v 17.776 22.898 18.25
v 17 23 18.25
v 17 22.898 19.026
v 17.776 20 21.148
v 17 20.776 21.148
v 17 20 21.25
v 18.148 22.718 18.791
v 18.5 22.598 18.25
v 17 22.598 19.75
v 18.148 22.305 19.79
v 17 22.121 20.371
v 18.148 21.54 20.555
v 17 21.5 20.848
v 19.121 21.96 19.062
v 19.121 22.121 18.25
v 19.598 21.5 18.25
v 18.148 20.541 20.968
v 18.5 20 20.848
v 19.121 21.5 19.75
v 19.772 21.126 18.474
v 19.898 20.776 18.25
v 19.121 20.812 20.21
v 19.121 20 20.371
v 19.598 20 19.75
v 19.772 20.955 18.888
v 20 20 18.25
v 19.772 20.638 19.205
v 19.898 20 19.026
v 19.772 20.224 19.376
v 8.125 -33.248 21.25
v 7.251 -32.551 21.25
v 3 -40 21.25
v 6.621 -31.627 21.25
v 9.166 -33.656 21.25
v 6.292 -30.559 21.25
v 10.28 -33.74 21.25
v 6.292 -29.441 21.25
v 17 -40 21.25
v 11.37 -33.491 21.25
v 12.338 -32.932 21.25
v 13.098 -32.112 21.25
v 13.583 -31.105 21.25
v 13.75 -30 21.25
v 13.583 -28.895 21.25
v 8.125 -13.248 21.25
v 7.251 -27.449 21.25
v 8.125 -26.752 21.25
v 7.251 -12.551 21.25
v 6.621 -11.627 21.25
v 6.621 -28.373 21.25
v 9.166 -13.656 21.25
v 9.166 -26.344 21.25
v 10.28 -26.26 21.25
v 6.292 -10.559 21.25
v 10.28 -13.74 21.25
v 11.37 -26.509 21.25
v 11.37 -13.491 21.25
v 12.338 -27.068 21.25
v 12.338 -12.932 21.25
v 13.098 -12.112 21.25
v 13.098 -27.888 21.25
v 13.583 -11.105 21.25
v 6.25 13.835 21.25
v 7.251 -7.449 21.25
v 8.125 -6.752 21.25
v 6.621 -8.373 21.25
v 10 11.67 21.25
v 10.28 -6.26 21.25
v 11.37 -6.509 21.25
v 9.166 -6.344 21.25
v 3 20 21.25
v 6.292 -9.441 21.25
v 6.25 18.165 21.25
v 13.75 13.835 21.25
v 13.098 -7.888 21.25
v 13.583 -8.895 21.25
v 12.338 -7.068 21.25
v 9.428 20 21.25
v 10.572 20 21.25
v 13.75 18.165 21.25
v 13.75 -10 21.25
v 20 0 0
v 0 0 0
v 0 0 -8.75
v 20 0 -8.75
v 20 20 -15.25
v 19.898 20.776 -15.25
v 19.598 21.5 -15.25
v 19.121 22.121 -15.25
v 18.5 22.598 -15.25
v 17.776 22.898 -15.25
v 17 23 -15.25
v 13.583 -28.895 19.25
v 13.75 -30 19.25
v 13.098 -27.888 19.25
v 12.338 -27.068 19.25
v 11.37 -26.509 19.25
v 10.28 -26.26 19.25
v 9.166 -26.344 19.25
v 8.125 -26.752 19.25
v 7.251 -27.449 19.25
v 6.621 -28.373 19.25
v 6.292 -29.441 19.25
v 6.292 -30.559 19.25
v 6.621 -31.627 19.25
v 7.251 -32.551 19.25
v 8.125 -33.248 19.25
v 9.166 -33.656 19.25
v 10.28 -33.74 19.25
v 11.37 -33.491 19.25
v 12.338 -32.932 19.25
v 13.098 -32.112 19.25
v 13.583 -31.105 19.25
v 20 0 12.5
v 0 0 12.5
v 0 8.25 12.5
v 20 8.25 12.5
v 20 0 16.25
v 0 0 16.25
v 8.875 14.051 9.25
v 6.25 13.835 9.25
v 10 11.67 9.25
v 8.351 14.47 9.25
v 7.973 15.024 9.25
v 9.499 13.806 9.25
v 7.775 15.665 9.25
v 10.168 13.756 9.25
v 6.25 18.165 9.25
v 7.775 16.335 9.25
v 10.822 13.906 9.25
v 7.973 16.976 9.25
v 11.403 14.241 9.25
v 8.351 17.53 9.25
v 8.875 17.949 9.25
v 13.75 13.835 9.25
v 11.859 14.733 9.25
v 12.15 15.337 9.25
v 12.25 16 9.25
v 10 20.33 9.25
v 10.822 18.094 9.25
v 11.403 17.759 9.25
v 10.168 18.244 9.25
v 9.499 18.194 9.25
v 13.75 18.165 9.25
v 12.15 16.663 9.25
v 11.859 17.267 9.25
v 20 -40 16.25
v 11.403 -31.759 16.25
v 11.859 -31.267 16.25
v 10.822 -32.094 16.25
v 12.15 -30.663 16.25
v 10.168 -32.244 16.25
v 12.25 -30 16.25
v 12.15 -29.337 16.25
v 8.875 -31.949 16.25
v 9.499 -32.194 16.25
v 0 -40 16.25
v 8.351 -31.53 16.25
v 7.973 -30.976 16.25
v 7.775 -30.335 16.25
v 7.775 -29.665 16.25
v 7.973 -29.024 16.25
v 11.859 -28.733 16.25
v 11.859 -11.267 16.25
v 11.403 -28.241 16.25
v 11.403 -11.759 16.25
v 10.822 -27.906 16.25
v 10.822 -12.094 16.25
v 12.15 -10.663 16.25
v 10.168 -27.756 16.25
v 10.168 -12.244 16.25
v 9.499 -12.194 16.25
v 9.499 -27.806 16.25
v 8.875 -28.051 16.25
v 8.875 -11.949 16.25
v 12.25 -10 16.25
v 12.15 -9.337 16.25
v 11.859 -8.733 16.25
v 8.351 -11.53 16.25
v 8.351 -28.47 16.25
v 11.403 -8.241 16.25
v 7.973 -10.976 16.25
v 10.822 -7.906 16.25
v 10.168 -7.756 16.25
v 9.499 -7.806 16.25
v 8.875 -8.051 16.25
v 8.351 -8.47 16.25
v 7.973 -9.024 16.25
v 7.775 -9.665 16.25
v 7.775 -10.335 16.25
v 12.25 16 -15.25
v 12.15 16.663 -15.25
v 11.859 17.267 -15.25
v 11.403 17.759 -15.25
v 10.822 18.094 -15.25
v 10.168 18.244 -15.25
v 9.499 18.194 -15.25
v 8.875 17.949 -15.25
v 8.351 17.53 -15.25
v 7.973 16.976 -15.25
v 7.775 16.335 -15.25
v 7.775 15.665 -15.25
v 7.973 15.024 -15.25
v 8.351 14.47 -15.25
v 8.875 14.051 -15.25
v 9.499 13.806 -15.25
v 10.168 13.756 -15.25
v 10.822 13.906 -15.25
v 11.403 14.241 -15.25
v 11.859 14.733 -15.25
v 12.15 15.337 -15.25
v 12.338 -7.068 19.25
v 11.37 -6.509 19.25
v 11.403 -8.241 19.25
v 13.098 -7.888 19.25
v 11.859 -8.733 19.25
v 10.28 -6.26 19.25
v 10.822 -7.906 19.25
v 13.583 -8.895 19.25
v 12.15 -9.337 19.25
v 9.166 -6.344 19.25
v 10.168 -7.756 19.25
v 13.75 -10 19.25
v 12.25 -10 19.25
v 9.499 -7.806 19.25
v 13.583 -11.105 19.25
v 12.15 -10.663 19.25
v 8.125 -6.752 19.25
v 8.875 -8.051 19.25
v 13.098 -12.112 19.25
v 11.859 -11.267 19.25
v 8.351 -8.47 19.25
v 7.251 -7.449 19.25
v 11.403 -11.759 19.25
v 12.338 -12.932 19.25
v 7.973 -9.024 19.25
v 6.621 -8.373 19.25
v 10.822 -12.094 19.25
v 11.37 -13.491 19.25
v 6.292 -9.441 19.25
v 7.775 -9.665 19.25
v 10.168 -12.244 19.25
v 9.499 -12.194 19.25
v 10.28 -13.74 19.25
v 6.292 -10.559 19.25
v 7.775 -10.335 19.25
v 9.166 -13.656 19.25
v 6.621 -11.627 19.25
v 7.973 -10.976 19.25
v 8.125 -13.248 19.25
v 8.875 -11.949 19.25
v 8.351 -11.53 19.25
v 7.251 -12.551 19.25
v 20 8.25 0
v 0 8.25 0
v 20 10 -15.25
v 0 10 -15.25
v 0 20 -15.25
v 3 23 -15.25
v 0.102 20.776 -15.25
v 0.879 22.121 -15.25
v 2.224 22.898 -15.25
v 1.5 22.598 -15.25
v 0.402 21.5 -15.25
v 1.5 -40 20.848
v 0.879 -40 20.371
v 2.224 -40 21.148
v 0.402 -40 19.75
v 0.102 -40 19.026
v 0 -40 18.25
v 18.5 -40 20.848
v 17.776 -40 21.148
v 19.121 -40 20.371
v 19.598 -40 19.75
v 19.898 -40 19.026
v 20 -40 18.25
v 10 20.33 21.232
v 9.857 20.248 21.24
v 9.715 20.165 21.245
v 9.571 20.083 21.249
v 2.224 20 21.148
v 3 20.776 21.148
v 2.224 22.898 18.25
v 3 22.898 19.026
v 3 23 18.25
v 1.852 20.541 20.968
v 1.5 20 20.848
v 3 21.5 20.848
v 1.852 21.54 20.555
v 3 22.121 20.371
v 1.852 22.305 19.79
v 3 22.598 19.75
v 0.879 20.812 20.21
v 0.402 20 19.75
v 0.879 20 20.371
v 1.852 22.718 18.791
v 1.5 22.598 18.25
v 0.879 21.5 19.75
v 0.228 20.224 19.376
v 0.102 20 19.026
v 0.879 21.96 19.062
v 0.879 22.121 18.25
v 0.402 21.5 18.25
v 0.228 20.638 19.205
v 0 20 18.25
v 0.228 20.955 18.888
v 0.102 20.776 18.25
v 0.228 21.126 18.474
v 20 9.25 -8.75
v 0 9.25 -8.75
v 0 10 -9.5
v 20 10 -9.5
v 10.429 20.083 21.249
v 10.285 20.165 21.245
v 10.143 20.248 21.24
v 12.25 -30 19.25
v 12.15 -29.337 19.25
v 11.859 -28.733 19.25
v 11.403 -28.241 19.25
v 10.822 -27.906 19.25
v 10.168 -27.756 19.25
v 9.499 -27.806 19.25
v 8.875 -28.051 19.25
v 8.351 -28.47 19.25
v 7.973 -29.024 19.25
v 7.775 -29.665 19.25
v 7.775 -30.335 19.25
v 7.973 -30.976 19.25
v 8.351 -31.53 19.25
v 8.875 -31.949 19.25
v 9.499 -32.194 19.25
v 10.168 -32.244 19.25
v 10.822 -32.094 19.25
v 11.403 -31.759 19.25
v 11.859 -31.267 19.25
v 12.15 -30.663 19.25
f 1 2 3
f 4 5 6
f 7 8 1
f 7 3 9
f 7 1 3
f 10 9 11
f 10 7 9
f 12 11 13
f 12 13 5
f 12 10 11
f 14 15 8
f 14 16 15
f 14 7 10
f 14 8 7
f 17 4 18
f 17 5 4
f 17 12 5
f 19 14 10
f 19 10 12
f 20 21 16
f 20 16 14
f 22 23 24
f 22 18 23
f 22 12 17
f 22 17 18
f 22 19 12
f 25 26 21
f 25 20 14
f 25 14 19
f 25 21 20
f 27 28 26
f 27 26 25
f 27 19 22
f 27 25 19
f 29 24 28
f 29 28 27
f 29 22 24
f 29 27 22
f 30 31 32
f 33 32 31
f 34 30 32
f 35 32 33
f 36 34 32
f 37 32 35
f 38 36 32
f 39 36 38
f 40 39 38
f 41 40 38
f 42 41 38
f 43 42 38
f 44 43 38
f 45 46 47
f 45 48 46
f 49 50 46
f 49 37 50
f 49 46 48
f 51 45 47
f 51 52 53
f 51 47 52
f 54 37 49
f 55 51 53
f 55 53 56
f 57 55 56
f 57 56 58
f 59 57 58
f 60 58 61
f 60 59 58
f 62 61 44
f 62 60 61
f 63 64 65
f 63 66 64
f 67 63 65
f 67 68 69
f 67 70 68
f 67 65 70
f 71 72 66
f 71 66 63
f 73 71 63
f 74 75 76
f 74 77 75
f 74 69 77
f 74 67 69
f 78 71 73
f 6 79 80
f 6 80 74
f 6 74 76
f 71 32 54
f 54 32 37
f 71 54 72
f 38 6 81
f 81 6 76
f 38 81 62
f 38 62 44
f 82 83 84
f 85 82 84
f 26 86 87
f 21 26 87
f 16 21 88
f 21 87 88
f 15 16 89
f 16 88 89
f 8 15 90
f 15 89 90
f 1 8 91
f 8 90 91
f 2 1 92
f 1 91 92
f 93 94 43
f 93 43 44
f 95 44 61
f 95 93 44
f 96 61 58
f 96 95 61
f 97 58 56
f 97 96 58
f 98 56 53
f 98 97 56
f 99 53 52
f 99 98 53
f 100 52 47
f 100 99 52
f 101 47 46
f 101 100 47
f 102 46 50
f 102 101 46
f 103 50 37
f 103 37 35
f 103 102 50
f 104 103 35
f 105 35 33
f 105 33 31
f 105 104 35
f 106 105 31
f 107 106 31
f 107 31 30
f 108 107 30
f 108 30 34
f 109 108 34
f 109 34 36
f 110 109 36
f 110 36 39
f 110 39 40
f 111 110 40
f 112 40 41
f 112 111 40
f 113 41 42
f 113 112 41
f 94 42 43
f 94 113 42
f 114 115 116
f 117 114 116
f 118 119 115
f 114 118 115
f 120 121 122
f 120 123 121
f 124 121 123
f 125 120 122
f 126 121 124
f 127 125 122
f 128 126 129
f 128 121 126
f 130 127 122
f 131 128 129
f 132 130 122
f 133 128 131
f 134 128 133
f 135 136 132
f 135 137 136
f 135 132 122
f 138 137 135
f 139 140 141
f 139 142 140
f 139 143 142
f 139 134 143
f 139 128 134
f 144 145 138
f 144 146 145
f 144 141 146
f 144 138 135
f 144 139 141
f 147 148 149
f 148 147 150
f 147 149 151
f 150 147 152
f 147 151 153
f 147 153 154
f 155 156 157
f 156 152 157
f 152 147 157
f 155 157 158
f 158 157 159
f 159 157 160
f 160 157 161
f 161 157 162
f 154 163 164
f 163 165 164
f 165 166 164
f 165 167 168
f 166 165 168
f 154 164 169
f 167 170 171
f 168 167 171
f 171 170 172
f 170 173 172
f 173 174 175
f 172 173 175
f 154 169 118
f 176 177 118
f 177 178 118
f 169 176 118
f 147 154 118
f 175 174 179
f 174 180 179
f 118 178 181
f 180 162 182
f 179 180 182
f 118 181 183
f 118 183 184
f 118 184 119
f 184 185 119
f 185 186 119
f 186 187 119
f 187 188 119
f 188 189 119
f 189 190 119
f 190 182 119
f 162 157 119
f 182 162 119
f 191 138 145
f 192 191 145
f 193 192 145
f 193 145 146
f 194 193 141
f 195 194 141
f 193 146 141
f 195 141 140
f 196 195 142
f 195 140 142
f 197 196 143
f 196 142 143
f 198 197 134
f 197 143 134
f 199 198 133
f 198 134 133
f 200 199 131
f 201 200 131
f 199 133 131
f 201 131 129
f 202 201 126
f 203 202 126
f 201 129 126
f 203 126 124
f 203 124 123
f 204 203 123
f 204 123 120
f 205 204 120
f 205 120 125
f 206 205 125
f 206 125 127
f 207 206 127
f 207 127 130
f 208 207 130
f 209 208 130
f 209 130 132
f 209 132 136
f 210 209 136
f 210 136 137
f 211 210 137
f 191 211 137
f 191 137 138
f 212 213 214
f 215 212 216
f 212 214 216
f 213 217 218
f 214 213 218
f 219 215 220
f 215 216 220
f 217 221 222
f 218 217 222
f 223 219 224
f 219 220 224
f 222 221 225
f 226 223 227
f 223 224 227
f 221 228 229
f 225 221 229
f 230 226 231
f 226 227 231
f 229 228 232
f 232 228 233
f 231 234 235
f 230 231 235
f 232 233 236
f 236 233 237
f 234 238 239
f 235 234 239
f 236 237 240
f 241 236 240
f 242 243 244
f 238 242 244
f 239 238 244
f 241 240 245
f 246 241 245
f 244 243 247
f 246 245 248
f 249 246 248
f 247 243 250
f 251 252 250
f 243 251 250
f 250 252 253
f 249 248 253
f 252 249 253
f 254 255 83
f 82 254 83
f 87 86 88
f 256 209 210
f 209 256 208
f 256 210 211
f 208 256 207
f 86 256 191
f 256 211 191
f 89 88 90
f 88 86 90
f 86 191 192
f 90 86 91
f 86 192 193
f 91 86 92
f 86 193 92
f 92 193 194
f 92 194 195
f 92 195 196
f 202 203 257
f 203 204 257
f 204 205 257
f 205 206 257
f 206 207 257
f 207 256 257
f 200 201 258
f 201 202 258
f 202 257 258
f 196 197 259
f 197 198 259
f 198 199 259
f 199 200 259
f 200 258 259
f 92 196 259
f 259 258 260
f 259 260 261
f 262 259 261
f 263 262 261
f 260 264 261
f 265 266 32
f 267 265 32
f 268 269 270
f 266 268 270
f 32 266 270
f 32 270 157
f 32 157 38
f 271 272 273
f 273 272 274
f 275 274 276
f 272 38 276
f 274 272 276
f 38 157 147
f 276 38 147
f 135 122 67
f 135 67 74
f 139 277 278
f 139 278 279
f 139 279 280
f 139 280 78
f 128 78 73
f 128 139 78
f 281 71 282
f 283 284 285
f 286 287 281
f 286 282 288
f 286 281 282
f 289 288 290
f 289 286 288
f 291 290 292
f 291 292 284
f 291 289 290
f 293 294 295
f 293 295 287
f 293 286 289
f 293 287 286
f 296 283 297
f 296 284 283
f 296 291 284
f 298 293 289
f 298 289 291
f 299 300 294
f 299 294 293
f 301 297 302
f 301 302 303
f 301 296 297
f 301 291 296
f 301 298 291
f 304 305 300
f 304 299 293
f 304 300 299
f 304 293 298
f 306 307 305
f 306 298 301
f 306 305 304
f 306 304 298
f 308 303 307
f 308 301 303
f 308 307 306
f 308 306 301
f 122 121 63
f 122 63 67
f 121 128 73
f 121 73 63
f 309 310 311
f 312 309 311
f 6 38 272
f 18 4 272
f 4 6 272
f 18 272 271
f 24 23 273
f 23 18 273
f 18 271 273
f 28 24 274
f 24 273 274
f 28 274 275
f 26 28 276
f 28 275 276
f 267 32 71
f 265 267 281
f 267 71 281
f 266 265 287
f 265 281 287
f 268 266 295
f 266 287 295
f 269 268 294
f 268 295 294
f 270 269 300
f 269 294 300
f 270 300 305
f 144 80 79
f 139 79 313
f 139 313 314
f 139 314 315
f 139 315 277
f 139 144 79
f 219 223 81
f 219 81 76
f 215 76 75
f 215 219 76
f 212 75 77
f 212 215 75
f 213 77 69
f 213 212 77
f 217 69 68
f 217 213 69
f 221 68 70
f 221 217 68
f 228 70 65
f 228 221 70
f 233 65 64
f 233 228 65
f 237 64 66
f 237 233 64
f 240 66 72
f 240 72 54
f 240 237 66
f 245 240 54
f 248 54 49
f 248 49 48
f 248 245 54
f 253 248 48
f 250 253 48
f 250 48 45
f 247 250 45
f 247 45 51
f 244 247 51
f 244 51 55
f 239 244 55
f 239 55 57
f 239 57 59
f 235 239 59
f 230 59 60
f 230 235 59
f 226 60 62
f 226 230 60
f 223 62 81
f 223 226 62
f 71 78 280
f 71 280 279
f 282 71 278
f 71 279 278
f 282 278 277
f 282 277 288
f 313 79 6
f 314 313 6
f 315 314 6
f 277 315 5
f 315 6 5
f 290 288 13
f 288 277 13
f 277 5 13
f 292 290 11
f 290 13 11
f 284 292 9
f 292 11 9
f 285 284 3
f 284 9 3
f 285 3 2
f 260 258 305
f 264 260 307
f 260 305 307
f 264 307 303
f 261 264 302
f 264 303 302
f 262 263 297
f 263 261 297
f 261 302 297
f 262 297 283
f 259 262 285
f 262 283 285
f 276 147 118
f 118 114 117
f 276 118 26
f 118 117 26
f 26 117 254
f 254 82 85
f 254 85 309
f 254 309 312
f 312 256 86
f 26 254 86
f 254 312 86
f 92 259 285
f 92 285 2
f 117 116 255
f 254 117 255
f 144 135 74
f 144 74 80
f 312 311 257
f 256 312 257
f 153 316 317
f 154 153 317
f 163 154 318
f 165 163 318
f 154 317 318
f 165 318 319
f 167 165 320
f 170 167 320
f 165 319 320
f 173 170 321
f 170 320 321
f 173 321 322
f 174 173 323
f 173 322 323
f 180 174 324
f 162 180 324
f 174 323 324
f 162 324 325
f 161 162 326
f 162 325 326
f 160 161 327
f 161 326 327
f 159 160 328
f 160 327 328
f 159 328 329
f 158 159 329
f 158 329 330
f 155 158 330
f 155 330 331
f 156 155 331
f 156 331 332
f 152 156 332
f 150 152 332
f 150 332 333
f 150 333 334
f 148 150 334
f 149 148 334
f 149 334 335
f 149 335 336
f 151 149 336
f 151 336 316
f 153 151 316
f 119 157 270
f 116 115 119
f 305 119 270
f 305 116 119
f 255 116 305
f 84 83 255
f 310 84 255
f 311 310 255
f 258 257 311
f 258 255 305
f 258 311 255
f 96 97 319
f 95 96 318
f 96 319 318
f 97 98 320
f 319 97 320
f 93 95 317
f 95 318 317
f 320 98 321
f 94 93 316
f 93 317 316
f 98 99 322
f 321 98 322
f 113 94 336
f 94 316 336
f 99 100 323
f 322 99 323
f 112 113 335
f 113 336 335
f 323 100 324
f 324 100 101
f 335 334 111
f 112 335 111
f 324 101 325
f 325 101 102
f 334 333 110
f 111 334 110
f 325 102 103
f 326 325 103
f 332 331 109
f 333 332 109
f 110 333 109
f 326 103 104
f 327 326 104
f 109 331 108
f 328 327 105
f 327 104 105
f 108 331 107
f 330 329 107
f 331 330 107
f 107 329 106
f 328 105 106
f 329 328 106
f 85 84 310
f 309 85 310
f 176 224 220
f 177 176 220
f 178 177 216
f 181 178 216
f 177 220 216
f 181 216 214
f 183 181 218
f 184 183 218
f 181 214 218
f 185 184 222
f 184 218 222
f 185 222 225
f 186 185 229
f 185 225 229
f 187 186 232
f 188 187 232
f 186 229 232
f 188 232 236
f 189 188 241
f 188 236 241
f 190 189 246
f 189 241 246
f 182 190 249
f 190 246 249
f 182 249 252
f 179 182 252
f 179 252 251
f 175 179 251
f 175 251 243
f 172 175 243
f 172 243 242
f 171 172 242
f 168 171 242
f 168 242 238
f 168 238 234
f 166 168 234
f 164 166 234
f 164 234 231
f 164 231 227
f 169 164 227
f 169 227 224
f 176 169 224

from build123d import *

# Parameters (mm, degrees)
BOSS_EXTRUDE1_DEPTH = 20
CUT_EXTRUDE1_REACH  = 58.482
SKETCH2_R           = 2.25
SKETCH3_W           = 20
SKETCH3_H           = 63
SKETCH3_R           = 3.75
BOSS_EXTRUDE2_DEPTH = 2
FILLET1_R           = 3
CUT_EXTRUDE2_DEPTH  = 10


with BuildPart() as part:
    # Sketch1 → Boss-Extrude1 (new body)
    with BuildSketch(Plane(origin=(0, 0, 0), x_dir=(0, 0, -1), z_dir=(1, 0, 0))):
        Polygon((8.75, 0), (8.75, 9.25), (9.5, 10), (15.25, 10), (15.25, 23), (-19.25, 23), (-19.25, -40), (-16.25, -40), (-16.25, 0), (-12.5, 0), (-12.5, 8.25), (0, 8.25), (0, 0), (3.75, 0), align=None)
    extrude(amount=BOSS_EXTRUDE1_DEPTH)

    # Sketch2 → Cut-Extrude1 (cut, up to next)
    with BuildSketch(Plane.XY.offset(19.25), mode=Mode.PRIVATE) as cut_extrude1_sk1:
        with Locations((10, -30)):
            Circle(SKETCH2_R)
    cut_extrude1_tool1 = extrude(cut_extrude1_sk1.sketch, amount=-CUT_EXTRUDE1_REACH, mode=Mode.PRIVATE) & part.part
    # Sketch2 → Cut-Extrude1 (cut, up to next)
    with BuildSketch(Plane.XY.offset(19.25), mode=Mode.PRIVATE) as cut_extrude1_sk2:
        with Locations((10, -10)):
            Circle(SKETCH2_R)
    cut_extrude1_tool2 = extrude(cut_extrude1_sk2.sketch, amount=-CUT_EXTRUDE1_REACH, mode=Mode.PRIVATE) & part.part
    # Sketch2 → Cut-Extrude1 (cut, up to next)
    with BuildSketch(Plane.XY.offset(19.25), mode=Mode.PRIVATE) as cut_extrude1_sk3:
        with Locations((10, 16)):
            Circle(SKETCH2_R)
    cut_extrude1_tool3 = extrude(cut_extrude1_sk3.sketch, amount=-CUT_EXTRUDE1_REACH, mode=Mode.PRIVATE) & part.part
    add(cut_extrude1_tool1.solids().sort_by_distance((10, -30, 19.25))[0], mode=Mode.SUBTRACT)
    add(cut_extrude1_tool2.solids().sort_by_distance((10, -10, 19.25))[0], mode=Mode.SUBTRACT)
    add(cut_extrude1_tool3.solids().sort_by_distance((10, 16, 19.25))[0], mode=Mode.SUBTRACT)

    # Sketch3 → Boss-Extrude2 (add)
    with BuildSketch(Plane.XY.offset(19.25)):
        with Locations((10, -8.5)):
            Rectangle(SKETCH3_W, SKETCH3_H)
        with Locations((10, -30)):
            Circle(SKETCH3_R, mode=Mode.SUBTRACT)
        with Locations((10, -10)):
            Circle(SKETCH3_R, mode=Mode.SUBTRACT)
        Polygon((13.75, 18.165063509), (10, 20.330127019), (6.25, 18.165063509), (6.25, 13.834936491), (10, 11.669872981), (13.75, 13.834936491), align=None, mode=Mode.SUBTRACT)
    extrude(amount=BOSS_EXTRUDE2_DEPTH)

    # Fillet1
    # the kernel refuses this fillet: 3 mm, written as the material it takes off along each edge
    with BuildSketch(Plane(origin=(3, 20, 18.25), x_dir=(0, 0, 1), z_dir=(-1, 0, 0))) as fillet1_piece_1_section:
        Polygon((0, 0), (FILLET1_R, 0), (FILLET1_R, FILLET1_R), (0, FILLET1_R), align=None)
    fillet1_piece_1 = extrude(amount=FILLET1_R, mode=Mode.PRIVATE)
    fillet1_piece_1 = fillet1_piece_1 - Plane(origin=(3, 20, 18.25), x_dir=(0, -0.7071067811865485, -0.7071067811865465), z_dir=(-1, 0, 0)) * Sphere(FILLET1_R, mode=Mode.PRIVATE)
    add(fillet1_piece_1, mode=Mode.SUBTRACT)
    with BuildSketch(Plane(origin=(17, 20, 18.25), x_dir=(0, 0, 1), z_dir=(1, 0, 0))) as fillet1_piece_2_section:
        Polygon((0, 0), (FILLET1_R, 0), (FILLET1_R, -FILLET1_R), (0, -FILLET1_R), align=None)
    fillet1_piece_2 = extrude(amount=FILLET1_R, mode=Mode.PRIVATE)
    fillet1_piece_2 = fillet1_piece_2 - Plane(origin=(17, 20, 18.25), x_dir=(0, -0.7071067811865485, -0.7071067811865465), z_dir=(1, 0, 0)) * Sphere(FILLET1_R, mode=Mode.PRIVATE)
    add(fillet1_piece_2, mode=Mode.SUBTRACT)
    with BuildSketch(Plane(origin=(0, 23, 18.25), x_dir=(1, 0, 0), z_dir=(0, 0, -1))) as fillet1_piece_3:
        with BuildLine():
            CenterArc((FILLET1_R, FILLET1_R), FILLET1_R, 180, 90)
            Line((0, FILLET1_R), (0, 0))
            Line((0, 0), (FILLET1_R, 0))
        make_face()
    extrude(amount=41, mode=Mode.SUBTRACT)
    with BuildSketch(Plane(origin=(20, 23, -22.75), x_dir=(0, -1, 0), z_dir=(0, 0, 1))) as fillet1_piece_4:
        with BuildLine():
            CenterArc((FILLET1_R, -FILLET1_R), FILLET1_R, 90, 90)
            Line((0, -FILLET1_R), (0, 0))
            Line((0, 0), (FILLET1_R, 0))
        make_face()
    extrude(amount=41, mode=Mode.SUBTRACT)
    with BuildSketch(Plane(origin=(17, 23, 21.25), x_dir=(0, -1, 0), z_dir=(-1, 0, 0))) as fillet1_piece_5:
        with BuildLine():
            CenterArc((FILLET1_R, -FILLET1_R), FILLET1_R, 90, 90)
            Line((0, -FILLET1_R), (0, 0))
            Line((0, 0), (FILLET1_R, 0))
        make_face()
    extrude(amount=14, mode=Mode.SUBTRACT)
    with BuildSketch(Plane(origin=(0, 20, 21.25), x_dir=(1, 0, 0), z_dir=(0, -1, 0))) as fillet1_piece_6:
        with BuildLine():
            CenterArc((FILLET1_R, -FILLET1_R), FILLET1_R, 90, 90)
            Line((0, -FILLET1_R), (0, 0))
            Line((0, 0), (FILLET1_R, 0))
        make_face()
    extrude(amount=67.5, mode=Mode.SUBTRACT)
    with BuildSketch(Plane(origin=(20, -47.5, 21.25), x_dir=(0, 0, -1), z_dir=(0, 1, 0))) as fillet1_piece_7:
        with BuildLine():
            CenterArc((FILLET1_R, FILLET1_R), FILLET1_R, 180, 90)
            Line((0, FILLET1_R), (0, 0))
            Line((0, 0), (FILLET1_R, 0))
        make_face()
    extrude(amount=67.5, mode=Mode.SUBTRACT)

    # Sketch4 → Cut-Extrude2 (cut)
    with BuildSketch(Plane.XY.offset(19.25)):
        Polygon((10, 11.669872981), (13.75, 13.834936491), (13.75, 18.165063509), (10, 20.330127019), (6.25, 18.165063509), (6.25, 13.834936491), align=None)
    extrude(amount=-CUT_EXTRUDE2_DEPTH, mode=Mode.SUBTRACT)


solid = part.part
